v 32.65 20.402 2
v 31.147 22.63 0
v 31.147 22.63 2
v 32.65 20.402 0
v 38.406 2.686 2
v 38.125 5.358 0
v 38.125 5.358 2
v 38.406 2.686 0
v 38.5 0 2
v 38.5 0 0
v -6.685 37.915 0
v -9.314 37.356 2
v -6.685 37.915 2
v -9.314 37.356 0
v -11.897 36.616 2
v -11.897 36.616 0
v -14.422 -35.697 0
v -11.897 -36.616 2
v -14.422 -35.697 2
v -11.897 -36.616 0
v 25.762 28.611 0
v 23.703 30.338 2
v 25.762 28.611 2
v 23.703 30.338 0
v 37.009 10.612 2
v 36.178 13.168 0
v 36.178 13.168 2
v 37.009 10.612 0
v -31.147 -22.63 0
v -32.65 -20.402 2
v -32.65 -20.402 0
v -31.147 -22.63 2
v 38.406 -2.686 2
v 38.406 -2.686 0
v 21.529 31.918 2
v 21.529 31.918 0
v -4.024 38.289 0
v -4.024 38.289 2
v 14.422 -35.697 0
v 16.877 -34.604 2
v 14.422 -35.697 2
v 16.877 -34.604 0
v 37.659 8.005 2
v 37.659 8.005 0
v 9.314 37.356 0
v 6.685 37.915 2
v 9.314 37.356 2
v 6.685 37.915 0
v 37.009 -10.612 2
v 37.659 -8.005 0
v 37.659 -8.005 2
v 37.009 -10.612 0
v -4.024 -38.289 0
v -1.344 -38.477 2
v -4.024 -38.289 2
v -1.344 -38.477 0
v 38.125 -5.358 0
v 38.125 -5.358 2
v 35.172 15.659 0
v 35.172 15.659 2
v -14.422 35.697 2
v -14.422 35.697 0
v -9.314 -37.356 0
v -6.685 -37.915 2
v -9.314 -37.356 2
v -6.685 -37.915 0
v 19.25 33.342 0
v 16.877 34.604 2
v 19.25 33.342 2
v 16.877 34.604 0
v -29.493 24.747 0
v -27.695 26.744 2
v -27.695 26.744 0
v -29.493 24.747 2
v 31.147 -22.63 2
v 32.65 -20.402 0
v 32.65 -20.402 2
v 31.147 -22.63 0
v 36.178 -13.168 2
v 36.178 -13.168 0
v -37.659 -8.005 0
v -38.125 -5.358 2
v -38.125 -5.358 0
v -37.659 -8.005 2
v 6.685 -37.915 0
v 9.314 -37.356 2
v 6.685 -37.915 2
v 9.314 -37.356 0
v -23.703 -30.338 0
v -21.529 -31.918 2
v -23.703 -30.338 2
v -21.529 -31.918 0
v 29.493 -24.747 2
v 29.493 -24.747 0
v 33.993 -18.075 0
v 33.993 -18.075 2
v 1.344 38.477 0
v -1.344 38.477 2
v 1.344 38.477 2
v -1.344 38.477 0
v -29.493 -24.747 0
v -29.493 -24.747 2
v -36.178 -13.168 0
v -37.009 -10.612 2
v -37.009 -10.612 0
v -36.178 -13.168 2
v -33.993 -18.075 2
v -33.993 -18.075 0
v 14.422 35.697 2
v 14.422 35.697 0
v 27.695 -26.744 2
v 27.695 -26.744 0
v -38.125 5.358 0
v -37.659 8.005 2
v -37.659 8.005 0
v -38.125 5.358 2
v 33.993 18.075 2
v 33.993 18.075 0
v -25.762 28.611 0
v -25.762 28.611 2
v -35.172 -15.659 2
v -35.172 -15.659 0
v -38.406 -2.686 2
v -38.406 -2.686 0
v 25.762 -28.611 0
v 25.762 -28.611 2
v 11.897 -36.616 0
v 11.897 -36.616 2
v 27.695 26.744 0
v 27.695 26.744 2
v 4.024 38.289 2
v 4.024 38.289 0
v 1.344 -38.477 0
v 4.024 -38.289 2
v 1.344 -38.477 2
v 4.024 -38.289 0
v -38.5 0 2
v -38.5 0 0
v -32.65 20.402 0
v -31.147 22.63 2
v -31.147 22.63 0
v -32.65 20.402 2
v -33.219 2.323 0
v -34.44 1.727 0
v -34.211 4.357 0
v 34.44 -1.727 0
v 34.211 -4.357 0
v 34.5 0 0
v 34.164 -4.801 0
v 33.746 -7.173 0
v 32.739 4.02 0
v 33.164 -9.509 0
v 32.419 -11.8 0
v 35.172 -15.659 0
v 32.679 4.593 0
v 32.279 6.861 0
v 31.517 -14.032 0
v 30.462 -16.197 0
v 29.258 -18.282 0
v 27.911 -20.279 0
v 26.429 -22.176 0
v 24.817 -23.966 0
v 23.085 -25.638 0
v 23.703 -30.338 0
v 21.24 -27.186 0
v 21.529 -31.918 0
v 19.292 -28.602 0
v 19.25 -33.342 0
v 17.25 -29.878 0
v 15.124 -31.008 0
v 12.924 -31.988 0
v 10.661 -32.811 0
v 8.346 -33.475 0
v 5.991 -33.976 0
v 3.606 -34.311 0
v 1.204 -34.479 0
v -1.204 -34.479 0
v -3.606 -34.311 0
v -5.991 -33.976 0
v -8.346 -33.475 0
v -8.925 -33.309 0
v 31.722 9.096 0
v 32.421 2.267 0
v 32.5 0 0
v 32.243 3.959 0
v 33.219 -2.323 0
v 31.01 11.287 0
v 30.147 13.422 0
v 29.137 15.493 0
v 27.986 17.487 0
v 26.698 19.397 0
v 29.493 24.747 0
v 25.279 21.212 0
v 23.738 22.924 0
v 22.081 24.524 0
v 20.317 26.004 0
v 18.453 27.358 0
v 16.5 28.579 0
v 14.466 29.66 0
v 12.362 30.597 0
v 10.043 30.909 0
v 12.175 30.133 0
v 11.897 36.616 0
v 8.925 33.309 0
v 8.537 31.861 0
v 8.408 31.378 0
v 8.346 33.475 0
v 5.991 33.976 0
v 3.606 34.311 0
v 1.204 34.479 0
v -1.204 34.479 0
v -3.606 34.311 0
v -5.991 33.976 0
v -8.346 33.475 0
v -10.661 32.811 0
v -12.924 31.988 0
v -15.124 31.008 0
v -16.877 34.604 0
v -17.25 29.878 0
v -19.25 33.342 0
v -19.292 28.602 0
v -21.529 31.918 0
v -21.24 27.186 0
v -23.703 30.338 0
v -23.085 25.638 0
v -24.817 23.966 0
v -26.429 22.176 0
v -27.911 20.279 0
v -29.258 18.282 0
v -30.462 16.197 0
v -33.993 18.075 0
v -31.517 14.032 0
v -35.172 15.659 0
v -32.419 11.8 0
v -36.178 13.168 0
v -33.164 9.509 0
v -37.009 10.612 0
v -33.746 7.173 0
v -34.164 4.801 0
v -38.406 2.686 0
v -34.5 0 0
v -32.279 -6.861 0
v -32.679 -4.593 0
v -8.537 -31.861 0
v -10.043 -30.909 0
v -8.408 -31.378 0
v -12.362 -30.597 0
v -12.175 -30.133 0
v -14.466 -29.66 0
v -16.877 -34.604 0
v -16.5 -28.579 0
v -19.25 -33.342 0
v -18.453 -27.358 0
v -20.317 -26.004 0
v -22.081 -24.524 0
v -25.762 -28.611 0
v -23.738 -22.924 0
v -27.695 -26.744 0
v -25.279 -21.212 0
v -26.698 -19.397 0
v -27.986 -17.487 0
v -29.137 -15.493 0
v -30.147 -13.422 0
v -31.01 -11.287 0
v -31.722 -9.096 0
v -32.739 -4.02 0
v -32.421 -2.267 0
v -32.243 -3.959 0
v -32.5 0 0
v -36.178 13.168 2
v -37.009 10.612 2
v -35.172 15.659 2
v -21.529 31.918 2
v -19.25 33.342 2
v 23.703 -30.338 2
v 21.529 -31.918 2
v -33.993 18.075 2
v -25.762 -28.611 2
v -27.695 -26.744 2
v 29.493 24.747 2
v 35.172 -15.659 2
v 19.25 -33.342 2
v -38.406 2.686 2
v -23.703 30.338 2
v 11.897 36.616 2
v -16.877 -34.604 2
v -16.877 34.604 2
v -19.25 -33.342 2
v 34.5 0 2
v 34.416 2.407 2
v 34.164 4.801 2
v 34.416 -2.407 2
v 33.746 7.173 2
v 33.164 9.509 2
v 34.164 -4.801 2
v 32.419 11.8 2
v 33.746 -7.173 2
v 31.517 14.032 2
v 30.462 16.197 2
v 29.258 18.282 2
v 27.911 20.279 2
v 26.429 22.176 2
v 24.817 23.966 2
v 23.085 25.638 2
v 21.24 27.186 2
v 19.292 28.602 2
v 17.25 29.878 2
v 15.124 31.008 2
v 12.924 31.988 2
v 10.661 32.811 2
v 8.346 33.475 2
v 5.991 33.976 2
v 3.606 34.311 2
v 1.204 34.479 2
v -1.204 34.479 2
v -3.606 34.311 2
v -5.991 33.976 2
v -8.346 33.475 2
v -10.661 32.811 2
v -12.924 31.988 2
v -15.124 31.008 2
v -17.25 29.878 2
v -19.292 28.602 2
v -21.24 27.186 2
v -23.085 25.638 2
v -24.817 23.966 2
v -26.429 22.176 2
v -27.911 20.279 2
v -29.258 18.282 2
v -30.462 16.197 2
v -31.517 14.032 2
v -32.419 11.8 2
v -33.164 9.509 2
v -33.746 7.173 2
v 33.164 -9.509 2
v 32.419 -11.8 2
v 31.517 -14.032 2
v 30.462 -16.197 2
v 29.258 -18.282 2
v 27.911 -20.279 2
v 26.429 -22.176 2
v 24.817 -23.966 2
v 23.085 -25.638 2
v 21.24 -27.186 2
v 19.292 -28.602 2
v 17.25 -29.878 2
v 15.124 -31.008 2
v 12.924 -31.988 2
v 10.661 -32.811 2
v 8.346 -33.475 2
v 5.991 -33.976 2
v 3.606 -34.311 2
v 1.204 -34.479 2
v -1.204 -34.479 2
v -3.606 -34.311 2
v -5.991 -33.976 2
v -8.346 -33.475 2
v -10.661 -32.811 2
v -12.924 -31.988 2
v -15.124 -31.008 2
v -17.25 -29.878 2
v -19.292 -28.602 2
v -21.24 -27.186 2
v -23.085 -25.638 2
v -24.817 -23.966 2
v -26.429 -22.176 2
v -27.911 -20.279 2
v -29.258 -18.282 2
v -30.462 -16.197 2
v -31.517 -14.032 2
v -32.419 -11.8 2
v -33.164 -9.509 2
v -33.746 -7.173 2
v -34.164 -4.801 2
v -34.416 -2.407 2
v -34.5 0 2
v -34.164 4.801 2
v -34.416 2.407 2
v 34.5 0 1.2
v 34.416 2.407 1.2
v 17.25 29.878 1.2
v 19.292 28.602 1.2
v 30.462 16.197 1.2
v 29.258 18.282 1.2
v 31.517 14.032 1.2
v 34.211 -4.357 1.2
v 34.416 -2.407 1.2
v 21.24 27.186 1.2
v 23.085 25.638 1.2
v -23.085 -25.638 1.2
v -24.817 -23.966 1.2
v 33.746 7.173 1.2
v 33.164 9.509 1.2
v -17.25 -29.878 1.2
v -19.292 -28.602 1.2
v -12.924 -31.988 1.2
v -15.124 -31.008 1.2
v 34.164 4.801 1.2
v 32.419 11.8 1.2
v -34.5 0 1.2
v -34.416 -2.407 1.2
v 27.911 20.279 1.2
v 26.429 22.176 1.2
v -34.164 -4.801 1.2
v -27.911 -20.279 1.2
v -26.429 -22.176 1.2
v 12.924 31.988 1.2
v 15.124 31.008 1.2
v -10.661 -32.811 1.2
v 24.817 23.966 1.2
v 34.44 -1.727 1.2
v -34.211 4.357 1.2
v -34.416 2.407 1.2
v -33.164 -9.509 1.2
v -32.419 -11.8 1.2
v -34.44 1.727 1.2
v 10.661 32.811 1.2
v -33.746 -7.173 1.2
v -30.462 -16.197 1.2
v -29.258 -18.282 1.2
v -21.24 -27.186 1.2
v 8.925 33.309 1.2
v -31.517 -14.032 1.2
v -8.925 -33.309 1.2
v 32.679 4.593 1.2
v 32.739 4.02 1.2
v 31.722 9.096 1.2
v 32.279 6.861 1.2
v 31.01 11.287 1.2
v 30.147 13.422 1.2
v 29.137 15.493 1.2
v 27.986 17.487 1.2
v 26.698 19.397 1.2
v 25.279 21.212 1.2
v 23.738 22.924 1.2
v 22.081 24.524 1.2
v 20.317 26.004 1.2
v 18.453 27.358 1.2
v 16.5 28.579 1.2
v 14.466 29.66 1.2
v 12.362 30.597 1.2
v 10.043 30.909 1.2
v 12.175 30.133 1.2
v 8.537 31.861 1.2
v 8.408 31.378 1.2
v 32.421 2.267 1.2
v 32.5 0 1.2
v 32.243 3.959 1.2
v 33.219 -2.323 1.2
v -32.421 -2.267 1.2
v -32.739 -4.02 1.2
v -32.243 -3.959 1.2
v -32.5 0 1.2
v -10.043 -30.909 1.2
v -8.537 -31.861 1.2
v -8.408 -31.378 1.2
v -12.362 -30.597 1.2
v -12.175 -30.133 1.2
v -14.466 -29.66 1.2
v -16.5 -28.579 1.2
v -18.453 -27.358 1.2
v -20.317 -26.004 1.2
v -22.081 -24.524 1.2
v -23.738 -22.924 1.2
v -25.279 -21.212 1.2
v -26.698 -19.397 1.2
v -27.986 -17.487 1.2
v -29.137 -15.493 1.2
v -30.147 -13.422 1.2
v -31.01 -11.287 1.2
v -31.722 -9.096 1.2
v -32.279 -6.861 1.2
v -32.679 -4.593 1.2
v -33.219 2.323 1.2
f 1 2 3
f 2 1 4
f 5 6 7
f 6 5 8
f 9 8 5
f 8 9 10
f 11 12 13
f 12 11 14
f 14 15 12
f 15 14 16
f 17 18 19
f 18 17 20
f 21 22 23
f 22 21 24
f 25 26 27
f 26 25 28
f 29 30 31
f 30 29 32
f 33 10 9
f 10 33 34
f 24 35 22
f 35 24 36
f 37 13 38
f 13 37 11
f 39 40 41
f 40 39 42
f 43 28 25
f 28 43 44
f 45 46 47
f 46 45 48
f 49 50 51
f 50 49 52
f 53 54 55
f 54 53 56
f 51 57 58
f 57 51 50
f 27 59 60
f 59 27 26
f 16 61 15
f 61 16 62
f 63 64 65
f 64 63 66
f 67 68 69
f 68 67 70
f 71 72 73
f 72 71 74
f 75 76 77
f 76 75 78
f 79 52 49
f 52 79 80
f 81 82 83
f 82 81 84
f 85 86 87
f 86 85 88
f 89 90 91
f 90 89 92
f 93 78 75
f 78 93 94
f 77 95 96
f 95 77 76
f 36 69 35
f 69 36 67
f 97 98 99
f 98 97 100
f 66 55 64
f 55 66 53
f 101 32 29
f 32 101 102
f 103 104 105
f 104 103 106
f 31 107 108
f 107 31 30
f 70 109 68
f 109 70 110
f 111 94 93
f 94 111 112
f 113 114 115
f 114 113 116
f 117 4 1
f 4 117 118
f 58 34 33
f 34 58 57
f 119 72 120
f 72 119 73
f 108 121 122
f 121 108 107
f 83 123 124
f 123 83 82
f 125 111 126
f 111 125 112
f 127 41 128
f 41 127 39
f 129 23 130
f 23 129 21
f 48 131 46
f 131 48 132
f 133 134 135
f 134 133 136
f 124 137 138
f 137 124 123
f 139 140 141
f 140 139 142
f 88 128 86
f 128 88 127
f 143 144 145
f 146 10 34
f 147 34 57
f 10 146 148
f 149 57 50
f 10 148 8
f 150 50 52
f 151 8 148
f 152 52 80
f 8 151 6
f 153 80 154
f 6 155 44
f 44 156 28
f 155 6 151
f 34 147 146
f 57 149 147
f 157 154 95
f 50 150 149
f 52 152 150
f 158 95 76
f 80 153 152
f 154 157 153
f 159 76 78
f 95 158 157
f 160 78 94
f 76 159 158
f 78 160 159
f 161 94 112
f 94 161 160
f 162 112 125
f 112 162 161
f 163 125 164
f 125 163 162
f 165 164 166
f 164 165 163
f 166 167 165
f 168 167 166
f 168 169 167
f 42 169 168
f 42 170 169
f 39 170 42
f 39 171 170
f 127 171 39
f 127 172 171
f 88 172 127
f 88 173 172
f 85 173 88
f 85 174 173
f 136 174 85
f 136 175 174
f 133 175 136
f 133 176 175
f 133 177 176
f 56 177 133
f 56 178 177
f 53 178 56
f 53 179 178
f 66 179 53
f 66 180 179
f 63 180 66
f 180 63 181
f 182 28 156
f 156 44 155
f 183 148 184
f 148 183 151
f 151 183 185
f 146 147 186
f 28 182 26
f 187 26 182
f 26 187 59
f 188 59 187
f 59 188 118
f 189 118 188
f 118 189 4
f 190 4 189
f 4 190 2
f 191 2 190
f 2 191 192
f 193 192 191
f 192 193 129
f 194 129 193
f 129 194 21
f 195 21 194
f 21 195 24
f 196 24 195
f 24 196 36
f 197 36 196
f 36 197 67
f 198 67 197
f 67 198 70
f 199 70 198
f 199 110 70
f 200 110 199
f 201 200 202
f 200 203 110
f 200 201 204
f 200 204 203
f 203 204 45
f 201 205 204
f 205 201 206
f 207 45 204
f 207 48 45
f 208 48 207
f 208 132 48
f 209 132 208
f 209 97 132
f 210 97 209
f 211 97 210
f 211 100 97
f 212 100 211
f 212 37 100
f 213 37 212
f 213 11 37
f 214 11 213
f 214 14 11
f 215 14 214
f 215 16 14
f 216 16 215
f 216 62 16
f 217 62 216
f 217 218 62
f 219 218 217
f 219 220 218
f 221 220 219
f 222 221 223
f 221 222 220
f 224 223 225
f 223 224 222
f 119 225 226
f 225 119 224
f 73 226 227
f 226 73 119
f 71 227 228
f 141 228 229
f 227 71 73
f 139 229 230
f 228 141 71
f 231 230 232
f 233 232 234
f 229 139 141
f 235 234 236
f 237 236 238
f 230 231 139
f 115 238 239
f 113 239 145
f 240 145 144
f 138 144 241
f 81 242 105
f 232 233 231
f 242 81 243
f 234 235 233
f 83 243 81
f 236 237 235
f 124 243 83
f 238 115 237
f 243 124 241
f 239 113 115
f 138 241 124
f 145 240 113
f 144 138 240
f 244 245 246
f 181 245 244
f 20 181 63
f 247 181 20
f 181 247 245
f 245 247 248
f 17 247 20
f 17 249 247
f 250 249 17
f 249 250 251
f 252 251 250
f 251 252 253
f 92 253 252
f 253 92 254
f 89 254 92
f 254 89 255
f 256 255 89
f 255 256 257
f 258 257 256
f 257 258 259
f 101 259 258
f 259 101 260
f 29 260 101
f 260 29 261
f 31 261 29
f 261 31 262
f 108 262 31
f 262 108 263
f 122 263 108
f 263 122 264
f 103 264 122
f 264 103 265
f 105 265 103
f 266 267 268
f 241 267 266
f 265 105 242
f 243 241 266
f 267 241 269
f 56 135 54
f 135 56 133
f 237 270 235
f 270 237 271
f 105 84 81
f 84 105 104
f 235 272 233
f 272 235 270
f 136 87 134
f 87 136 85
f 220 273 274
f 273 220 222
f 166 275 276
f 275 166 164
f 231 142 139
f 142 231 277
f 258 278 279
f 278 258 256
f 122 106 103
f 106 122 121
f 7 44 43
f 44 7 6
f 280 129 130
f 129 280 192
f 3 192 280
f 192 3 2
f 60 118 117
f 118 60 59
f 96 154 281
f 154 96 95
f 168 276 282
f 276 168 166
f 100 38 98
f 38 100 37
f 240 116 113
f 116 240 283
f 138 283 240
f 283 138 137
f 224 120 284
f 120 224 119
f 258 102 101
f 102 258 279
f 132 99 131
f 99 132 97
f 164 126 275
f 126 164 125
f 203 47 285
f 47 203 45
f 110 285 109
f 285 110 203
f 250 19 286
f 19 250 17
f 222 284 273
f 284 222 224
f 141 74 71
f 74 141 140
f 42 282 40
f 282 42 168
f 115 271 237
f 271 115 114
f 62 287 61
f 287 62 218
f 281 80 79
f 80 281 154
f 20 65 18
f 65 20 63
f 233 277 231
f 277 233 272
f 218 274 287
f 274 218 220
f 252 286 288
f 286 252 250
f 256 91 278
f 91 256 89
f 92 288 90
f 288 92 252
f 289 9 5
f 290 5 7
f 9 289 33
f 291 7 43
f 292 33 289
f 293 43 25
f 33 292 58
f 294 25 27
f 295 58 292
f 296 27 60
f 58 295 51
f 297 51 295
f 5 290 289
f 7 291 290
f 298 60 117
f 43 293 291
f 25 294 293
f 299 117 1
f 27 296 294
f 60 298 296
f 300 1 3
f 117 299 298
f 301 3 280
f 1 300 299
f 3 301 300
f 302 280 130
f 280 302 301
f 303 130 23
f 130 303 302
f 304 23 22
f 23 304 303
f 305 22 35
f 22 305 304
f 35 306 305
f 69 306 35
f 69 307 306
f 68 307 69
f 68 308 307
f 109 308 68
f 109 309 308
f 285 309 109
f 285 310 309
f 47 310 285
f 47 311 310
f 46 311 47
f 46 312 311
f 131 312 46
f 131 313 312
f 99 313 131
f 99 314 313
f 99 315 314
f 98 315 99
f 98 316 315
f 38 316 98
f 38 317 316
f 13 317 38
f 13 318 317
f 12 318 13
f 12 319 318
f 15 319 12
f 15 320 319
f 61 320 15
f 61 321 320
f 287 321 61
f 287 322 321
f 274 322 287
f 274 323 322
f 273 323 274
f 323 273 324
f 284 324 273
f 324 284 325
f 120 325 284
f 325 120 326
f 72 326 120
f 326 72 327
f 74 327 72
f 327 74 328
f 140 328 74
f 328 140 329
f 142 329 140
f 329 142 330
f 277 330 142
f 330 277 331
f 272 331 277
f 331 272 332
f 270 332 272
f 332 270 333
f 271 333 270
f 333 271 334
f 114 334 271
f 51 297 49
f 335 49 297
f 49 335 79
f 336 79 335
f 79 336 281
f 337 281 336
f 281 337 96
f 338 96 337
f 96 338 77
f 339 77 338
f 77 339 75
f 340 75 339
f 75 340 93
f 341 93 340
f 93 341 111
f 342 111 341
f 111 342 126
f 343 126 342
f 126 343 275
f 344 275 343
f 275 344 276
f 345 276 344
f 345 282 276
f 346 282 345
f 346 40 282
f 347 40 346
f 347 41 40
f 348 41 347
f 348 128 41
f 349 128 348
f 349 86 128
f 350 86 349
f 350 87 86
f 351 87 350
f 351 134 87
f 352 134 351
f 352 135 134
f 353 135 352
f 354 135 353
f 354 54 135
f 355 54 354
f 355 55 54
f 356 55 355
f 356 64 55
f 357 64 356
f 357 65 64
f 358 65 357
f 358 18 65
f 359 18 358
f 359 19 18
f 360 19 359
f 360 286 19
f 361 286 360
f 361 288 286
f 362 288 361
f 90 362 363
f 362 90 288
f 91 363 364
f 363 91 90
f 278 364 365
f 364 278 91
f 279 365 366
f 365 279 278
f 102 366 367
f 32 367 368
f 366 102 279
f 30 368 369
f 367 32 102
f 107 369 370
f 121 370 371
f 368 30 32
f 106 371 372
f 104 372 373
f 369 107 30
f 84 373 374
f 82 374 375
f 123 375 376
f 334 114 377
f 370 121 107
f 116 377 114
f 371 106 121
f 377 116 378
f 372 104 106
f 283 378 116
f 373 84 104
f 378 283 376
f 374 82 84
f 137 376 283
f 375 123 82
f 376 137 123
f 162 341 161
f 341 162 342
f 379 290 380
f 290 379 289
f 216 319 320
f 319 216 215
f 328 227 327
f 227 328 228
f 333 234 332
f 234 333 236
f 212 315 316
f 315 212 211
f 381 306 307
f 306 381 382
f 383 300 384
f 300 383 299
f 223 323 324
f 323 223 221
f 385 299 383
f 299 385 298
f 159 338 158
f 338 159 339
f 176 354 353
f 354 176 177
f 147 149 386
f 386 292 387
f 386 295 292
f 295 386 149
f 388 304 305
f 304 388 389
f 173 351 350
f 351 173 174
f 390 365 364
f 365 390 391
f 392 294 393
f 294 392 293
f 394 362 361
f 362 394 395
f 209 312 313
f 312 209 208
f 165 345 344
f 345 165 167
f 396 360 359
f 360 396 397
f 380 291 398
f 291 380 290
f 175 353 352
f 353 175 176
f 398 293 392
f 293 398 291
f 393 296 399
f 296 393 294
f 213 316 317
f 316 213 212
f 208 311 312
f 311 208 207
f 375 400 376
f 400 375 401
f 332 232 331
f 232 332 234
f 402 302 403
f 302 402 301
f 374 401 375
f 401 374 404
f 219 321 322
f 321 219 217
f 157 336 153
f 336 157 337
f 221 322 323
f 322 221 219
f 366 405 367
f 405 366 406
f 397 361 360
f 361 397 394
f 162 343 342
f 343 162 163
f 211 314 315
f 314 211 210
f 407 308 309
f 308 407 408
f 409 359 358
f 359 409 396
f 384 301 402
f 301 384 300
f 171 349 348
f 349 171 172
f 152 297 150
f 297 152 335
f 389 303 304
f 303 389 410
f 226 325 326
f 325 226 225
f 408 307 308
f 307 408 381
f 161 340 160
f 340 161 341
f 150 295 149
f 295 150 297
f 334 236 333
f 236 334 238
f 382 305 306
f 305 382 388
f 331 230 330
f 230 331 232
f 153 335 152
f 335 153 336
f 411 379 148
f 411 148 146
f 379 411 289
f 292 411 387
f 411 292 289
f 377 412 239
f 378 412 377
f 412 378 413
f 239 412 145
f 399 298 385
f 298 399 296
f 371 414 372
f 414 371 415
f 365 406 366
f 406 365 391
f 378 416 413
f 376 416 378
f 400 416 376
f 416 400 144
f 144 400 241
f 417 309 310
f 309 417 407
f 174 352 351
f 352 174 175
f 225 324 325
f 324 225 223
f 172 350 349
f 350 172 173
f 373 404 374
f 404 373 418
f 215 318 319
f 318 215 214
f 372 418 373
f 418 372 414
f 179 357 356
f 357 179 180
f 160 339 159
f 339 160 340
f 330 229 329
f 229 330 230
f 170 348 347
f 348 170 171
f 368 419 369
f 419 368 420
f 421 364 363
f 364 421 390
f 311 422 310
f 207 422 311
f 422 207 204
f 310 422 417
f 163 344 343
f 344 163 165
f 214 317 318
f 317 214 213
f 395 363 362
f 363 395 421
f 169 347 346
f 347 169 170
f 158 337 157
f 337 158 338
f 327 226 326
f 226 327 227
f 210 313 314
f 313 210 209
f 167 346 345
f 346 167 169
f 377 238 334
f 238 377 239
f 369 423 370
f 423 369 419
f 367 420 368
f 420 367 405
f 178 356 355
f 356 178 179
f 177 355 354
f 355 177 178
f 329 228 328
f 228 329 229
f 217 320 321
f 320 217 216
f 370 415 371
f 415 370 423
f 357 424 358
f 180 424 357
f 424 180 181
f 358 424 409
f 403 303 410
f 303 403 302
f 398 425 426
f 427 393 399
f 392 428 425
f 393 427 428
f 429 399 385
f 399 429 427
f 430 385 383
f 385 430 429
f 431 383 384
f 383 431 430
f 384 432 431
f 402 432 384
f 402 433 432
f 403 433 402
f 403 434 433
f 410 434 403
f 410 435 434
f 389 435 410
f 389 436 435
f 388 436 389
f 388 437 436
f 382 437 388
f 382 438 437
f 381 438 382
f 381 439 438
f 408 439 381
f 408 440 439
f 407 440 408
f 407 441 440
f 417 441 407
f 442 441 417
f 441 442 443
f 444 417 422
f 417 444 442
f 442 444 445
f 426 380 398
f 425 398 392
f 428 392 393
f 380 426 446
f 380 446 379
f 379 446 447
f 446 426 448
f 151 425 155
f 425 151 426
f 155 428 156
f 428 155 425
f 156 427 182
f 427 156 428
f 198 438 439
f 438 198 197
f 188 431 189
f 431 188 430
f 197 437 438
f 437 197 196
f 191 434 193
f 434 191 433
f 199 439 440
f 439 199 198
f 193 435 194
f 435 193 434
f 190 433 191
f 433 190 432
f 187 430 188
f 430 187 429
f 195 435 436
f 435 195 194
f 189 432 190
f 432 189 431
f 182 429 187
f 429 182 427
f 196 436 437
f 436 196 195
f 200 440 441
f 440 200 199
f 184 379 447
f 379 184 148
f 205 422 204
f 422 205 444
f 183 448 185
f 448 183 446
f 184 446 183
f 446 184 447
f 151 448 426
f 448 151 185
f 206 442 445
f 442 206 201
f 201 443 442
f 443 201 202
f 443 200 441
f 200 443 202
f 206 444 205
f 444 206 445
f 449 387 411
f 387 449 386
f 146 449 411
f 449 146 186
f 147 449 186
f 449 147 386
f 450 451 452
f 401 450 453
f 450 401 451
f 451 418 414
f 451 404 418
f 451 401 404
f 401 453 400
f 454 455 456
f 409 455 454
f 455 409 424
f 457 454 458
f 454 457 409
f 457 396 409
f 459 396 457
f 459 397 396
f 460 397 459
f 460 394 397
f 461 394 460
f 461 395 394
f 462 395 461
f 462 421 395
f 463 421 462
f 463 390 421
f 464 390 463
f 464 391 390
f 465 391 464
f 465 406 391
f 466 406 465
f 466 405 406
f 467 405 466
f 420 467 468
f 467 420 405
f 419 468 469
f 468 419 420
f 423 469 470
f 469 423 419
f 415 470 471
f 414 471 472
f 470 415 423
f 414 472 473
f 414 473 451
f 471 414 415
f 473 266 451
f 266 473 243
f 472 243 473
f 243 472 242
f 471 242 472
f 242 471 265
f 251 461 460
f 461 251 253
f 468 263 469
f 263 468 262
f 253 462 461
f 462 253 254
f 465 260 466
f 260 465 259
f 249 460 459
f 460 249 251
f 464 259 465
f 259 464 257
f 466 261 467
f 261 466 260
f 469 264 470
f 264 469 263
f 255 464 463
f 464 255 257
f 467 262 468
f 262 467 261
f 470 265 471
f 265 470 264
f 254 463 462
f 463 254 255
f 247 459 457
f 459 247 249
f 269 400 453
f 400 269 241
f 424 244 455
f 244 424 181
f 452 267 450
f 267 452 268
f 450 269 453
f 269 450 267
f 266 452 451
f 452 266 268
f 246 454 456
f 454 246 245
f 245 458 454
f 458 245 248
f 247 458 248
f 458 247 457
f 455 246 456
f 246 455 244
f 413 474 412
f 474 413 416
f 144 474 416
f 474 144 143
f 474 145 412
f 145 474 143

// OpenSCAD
// file: ../../my_lib.scad
tolerance = 0.15; 

module bigger(t = tolerance) {
    if (t > 0) {
        minkowski() {
            child(0);
            cube(t, true);
        }
    } else {
        child(0);
    }
}

rounding = 1;
module round(r = rounding) {
	minkowski() {
		child(0);
		sphere(r);
	}
}

module tube(outer_radius, inner_radius, height) {
    difference() {
        cylinder(h = height, r = outer_radius);
        translate([ 0, 0, -1]) cylinder(h = height + 2, r = inner_radius);
    }
}

module pie_slice(outer_radius, inner_radius, angle, height) {
    o1 = outer_radius + 1;
    blocking_half = [2* o1, o1, height + 1];
	blocking_quarter = [o1, o1, height + 1];
	if (angle <= 0) {
		//nothing
	} else if (angle <= 90) {
		difference() {
			tube(outer_radius, inner_radius, height);
			translate([-o1, -o1, -0.5]) cube(blocking_half);
			translate([-o1, -0.5, -0.5]) cube(blocking_quarter);
			rotate([0,0,angle]) translate([0, 0, -0.5]) cube(blocking_quarter);
		}
	} else if (angle <= 180) {
		difference() {
			tube(outer_radius, inner_radius, height);
			translate([-o1, -o1, -0.5]) cube(blocking_half);
			rotate([0,0,angle]) translate([0, 0, -0.5]) cube(blocking_quarter);
		}
	} else if (angle <= 270) {
		difference() {
			tube(outer_radius, inner_radius, height);
			translate([0, -o1, -0.5]) cube(blocking_quarter);
			rotate([0,0,angle]) translate([0, 0, -0.5]) cube(blocking_quarter);
		}
	} else if (angle <= 360) {
		difference() {
			tube(outer_radius, inner_radius, height);
			intersection() {
				translate([0, -o1, -0.5]) cube(blocking_quarter);
				rotate([0,0,angle]) translate([0, 0, -0.5]) cube(blocking_quarter);
			}
		}
	} else {
		tube(outer_radius, inner_radius, height);
	}
}

module torus (r1 = 2, r2 = 1, a = 360) {
	intersection() {
		rotate_extrude(convexity = 10, $fn = 50)
			translate([r1, 0, 0])
				circle(r = r2, $fn = 20);
		translate([0, 0, -r2 -0.5])
			pie_slice(r1 + r2 + 1, r1 - r2 - 1, a, 2*r2 + 1);
	}
}

module trapeze(h, w, r1, r2, center = false) {
    rotate([-90,0,0]) linear_extrude(height = w) projection(false) rotate([90,0,0]) cylinder(h, r1/2, r2/2, center);
}
// main file
$fa=4;
$fs=0.5;

include <../../my_lib.scad>

//adapter that can mimic an hb-42 lens hood

outer = 69/2;
inner = 66/2;
bump = 0.5;

union(){
	tube(outer+4,outer,2);
	for (i = [0, 1]) {
		rotate([0,0,180*i]){
			pie_slice(outer + 0.1,inner,75,1.2);
			pie_slice(outer + 0.1,inner-bump,7,1.2);
			rotate([0,0,68]) pie_slice(outer + 0.1,inner-bump,7,1.2);
			rotate([0,0,-4])
				translate([inner+0.3,0,0])
					rotate([0,0,-60])
						cube([4,3,1.2]);
		}
	}
}
